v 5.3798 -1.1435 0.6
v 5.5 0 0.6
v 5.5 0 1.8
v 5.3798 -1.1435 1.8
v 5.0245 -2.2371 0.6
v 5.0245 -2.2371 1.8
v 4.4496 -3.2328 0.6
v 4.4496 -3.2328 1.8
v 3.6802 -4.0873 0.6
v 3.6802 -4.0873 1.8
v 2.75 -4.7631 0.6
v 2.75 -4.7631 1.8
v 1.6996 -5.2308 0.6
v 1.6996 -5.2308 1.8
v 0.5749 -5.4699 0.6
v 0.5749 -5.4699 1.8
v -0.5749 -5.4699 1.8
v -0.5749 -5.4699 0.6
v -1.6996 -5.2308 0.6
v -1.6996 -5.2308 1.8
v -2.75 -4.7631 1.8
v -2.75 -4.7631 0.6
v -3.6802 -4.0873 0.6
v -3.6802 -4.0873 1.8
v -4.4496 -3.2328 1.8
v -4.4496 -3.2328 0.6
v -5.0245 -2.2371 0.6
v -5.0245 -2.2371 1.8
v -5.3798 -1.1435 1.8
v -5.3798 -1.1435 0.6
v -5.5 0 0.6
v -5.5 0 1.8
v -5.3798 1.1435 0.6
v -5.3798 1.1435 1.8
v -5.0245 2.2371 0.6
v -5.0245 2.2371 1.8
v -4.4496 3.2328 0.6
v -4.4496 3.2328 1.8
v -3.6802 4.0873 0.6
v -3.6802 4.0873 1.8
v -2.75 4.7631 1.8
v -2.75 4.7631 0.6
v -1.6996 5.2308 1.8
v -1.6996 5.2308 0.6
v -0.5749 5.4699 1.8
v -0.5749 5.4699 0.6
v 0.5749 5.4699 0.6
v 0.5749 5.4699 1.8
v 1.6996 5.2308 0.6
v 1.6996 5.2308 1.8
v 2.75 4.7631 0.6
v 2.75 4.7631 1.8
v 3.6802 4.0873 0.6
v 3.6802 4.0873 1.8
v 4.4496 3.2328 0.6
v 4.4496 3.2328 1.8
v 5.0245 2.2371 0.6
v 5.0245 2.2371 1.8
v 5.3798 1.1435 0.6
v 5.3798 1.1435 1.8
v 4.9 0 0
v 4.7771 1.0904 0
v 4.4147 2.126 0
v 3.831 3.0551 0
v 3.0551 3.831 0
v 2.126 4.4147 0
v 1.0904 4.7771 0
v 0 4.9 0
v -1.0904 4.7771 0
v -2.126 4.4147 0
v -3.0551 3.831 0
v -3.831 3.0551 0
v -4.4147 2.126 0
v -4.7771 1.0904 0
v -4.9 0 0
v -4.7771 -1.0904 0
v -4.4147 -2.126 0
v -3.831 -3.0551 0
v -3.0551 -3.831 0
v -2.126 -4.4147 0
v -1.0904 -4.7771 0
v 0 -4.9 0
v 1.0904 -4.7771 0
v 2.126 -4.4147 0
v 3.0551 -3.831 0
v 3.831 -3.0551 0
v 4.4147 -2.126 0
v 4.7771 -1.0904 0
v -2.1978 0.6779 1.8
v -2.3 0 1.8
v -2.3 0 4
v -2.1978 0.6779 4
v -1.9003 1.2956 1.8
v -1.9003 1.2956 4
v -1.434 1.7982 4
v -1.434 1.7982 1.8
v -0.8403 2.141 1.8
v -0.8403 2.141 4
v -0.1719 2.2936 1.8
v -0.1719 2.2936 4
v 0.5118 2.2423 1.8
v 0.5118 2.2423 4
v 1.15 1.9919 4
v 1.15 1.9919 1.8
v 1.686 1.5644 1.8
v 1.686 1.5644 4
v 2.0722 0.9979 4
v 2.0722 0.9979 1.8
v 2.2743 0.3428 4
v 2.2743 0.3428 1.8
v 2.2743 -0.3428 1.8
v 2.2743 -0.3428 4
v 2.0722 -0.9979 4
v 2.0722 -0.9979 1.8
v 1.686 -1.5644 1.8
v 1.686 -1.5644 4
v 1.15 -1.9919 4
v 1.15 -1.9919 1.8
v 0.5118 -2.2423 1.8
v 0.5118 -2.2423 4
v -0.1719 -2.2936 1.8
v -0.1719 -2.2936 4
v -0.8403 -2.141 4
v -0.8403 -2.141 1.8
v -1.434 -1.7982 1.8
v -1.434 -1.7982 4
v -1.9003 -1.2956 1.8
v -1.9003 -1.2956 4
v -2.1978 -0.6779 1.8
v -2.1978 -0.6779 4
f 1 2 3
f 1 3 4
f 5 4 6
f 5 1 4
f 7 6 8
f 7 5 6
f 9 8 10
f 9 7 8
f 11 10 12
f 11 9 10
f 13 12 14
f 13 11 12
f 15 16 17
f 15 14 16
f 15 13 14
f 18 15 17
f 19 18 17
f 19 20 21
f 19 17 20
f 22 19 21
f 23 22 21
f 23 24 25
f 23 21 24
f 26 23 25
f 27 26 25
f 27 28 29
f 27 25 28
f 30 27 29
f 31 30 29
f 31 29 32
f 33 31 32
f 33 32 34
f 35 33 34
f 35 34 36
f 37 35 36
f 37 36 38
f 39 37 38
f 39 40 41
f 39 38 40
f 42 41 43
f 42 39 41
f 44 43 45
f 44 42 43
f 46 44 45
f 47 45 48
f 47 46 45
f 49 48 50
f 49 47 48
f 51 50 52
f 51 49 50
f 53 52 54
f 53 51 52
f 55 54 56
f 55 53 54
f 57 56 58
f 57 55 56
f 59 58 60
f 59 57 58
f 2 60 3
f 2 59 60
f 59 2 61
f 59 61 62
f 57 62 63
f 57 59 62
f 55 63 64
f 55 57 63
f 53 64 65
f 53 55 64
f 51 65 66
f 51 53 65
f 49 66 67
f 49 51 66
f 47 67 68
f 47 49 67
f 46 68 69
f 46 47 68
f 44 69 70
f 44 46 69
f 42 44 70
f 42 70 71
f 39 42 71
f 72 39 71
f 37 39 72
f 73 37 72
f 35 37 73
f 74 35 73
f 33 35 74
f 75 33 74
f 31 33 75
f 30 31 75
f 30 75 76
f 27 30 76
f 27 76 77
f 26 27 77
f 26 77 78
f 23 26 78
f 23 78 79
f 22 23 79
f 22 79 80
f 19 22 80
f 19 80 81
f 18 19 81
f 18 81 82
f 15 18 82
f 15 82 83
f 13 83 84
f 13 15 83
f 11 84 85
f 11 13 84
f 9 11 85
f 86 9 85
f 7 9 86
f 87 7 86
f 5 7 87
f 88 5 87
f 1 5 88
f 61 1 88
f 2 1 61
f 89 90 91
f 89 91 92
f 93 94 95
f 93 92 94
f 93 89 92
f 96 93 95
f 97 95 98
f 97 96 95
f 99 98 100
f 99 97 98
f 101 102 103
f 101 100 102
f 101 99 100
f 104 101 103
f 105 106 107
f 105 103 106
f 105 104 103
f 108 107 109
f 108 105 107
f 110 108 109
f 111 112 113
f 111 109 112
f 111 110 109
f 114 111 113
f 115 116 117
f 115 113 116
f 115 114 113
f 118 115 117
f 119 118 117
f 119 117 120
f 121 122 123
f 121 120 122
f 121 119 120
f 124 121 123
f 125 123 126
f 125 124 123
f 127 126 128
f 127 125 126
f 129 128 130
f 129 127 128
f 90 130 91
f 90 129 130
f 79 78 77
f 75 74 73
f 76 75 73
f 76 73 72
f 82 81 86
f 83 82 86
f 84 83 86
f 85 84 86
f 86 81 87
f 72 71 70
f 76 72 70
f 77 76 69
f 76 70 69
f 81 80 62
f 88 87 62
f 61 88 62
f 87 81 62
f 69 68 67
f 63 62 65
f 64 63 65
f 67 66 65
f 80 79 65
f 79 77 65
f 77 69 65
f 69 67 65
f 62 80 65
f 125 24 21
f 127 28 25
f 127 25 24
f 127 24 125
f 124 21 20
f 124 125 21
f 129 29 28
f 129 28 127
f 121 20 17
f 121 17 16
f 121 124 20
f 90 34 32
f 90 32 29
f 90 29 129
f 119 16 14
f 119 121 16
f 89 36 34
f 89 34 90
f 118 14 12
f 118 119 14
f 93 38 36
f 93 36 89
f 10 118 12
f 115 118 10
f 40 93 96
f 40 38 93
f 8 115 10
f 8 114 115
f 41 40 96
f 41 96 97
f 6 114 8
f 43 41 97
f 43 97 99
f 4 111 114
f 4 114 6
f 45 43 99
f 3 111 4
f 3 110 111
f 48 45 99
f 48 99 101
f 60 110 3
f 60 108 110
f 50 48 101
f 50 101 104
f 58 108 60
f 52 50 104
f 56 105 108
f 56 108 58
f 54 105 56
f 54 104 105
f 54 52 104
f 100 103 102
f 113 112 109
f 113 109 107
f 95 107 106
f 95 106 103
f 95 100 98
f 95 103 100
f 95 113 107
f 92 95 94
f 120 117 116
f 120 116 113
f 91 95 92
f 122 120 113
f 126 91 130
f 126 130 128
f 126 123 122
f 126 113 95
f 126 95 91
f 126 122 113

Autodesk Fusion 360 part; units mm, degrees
sketch "Sketch1" plane through (0, 0, 0) normal (0, 0, 1) x (1, 0, 0)
  circle A0 centre (0, 0) radius 5.5
  dimension "d3" = 11
extrude "Extrude1" add sketch "Sketch1" along normal blind 1.8
sketch "Sketch2" plane through (0, 0, 1.8) normal (0, 0, 1) x (-1, 0, 0)
  circle A0 centre (0, 0) radius 5.5
  circle A1 centre (0, 0) radius 2.3
  dimension "d6" = 4.6
extrude "Extrude2" add sketch "Sketch2" along normal blind 2.2 contours A1
chamfer "Chamfer1" distance 0.6 angle 45 1 edges at (-5.1278, -1.9889, 0)
